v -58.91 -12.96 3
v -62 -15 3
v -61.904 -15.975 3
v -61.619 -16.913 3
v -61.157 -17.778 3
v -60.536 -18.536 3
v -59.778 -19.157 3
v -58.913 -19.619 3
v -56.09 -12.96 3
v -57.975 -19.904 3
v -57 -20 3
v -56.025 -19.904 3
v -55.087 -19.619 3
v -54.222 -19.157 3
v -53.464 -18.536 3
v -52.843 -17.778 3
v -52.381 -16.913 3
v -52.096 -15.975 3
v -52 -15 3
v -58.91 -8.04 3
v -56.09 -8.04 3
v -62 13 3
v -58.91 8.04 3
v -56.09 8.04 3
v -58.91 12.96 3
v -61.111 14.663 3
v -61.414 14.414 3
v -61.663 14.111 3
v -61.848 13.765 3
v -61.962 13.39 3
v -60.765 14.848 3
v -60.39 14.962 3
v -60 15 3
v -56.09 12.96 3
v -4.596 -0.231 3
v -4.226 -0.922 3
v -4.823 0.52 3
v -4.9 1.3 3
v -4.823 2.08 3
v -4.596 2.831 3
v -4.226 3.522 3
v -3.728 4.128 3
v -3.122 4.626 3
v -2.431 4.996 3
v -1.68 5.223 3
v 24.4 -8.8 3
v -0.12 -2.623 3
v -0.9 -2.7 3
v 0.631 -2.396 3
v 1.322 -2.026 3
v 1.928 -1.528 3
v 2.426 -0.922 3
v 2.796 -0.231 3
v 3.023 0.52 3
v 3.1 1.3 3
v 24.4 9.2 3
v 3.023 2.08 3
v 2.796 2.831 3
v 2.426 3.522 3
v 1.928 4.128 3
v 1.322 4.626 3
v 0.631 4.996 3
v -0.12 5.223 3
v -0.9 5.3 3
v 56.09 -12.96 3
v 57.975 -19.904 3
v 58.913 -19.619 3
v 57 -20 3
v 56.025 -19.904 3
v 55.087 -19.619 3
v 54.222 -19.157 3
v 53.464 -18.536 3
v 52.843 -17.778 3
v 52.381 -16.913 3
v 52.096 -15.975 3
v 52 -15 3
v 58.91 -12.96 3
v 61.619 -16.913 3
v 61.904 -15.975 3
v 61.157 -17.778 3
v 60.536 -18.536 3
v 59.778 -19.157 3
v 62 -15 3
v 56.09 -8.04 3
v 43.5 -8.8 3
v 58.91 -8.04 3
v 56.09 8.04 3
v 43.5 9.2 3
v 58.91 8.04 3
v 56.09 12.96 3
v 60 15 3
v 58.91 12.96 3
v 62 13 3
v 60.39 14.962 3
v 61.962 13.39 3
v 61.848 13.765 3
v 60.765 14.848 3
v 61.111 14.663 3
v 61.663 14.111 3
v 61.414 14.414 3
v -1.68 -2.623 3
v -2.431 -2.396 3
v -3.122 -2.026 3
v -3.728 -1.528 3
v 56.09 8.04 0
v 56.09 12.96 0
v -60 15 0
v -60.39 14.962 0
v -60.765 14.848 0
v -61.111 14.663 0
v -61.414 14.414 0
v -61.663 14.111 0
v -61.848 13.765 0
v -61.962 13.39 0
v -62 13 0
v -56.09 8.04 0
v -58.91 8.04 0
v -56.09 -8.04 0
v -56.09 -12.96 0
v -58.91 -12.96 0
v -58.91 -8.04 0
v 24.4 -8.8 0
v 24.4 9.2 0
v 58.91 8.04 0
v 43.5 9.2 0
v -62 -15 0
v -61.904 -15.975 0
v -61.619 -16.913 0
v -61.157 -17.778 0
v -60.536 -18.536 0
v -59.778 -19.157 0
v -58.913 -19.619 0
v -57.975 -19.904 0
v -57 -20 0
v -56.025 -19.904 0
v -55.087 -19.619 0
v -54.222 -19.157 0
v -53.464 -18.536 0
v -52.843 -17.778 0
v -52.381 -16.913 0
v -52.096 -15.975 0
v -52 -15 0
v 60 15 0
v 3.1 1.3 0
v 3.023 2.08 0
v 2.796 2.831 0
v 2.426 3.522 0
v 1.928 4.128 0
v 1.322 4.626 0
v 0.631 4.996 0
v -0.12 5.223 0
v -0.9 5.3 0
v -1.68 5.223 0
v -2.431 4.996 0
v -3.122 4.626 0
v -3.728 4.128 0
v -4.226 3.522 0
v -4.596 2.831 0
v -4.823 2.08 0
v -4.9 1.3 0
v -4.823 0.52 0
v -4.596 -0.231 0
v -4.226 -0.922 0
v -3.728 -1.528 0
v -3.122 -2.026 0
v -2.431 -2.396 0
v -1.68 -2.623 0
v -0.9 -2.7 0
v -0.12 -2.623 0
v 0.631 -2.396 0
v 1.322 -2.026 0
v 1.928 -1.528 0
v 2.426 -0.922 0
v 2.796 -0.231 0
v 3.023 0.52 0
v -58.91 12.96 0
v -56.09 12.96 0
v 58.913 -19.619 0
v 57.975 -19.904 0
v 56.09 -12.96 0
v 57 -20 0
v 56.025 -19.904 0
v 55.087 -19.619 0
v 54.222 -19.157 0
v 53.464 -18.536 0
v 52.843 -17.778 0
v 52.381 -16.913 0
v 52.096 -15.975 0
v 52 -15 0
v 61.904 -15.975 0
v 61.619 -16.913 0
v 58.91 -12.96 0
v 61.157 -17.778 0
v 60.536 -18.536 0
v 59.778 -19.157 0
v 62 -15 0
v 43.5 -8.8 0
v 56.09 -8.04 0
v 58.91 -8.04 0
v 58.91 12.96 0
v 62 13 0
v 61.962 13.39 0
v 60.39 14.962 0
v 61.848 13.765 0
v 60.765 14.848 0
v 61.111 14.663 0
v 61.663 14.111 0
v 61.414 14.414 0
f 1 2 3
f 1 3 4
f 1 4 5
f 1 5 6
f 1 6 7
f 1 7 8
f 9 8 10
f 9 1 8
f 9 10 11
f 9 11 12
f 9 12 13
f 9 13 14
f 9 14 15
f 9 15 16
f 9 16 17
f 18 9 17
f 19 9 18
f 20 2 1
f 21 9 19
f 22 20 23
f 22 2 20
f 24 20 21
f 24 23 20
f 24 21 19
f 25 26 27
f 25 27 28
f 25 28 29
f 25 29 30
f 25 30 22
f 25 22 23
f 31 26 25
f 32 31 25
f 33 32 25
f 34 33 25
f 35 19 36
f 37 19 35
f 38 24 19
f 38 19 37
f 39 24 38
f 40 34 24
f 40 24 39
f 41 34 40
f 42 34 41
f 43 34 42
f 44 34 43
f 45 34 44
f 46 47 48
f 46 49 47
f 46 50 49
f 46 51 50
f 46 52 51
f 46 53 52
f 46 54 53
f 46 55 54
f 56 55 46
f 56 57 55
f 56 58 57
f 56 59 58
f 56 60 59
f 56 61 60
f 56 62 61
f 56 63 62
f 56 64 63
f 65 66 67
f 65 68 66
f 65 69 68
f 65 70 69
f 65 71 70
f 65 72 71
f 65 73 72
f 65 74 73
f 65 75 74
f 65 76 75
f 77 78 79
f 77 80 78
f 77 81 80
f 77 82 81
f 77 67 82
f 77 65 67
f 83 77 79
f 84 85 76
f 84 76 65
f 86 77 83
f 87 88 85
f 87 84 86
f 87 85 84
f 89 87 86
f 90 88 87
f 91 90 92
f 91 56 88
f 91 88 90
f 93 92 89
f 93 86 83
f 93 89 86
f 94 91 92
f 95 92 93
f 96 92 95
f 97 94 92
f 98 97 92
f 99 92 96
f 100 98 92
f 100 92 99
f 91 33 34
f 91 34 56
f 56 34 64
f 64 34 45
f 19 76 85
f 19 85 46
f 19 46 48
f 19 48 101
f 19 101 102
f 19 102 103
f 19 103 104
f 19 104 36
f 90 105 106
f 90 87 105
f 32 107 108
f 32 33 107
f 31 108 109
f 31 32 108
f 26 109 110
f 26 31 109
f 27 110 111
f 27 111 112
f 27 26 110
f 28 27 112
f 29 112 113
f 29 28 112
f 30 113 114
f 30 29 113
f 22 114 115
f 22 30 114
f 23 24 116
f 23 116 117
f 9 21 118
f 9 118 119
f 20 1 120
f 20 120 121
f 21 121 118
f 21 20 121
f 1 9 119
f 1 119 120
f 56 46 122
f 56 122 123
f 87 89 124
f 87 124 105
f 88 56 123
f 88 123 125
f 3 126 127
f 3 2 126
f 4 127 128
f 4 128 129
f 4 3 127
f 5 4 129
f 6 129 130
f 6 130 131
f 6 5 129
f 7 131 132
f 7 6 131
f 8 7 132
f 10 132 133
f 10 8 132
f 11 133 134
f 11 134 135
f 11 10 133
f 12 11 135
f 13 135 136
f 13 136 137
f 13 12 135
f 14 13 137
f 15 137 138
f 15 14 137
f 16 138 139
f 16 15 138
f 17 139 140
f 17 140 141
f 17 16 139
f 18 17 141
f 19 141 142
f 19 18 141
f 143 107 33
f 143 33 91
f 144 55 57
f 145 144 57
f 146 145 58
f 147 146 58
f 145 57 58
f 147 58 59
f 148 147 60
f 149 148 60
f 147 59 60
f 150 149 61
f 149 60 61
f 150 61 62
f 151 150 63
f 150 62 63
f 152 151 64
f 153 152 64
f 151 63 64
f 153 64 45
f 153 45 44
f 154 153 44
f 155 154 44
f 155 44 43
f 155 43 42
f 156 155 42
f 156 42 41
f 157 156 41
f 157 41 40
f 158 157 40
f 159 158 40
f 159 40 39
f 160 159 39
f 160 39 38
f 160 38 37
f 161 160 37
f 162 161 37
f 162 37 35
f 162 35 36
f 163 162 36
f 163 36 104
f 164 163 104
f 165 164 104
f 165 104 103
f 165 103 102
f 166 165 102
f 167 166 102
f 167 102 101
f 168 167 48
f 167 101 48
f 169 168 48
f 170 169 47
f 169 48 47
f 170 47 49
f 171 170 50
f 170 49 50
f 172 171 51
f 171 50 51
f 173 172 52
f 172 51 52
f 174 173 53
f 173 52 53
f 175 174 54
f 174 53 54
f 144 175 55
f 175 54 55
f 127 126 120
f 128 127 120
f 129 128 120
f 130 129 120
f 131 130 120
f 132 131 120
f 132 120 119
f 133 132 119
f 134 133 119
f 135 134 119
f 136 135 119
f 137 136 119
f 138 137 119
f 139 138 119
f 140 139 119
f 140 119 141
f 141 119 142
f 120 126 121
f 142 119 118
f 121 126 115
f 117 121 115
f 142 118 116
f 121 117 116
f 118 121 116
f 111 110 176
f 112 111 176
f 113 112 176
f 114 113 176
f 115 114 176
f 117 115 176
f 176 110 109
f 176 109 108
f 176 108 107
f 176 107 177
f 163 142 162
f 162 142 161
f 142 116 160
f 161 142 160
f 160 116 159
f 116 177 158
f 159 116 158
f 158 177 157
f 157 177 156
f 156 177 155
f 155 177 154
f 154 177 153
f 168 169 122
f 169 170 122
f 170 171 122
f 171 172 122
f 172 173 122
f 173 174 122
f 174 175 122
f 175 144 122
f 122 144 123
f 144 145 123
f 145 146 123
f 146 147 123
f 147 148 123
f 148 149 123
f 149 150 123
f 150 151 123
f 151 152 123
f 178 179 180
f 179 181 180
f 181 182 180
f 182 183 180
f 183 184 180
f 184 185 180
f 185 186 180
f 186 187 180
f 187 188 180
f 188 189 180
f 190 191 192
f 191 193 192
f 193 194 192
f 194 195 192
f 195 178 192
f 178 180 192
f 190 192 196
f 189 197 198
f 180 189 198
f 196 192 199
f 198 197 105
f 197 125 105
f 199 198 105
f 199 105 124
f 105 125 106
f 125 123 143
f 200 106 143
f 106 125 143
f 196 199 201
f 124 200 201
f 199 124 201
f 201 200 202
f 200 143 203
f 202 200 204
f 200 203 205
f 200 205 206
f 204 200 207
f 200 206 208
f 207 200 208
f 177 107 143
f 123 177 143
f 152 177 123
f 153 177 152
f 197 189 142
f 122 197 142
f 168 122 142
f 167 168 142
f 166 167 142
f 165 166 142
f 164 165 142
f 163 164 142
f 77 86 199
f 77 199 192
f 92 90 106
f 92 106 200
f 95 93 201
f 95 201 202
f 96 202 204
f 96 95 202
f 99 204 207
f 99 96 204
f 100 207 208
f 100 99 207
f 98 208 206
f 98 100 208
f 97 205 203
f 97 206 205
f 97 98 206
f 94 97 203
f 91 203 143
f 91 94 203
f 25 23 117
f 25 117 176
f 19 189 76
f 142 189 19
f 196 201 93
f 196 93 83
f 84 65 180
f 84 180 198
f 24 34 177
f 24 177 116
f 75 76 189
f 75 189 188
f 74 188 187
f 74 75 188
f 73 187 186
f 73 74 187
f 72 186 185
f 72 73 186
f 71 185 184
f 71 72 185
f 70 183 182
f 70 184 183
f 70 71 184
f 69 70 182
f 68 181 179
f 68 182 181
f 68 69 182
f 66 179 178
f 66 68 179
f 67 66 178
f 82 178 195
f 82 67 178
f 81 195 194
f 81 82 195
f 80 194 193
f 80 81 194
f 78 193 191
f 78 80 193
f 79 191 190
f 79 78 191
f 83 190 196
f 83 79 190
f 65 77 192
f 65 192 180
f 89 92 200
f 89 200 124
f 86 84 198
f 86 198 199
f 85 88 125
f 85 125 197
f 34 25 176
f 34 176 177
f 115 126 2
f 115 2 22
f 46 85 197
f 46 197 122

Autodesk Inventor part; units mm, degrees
ref_plane "YZ Plane" through (0, 0, 0) normal (1, 0, 0) x (0, 1, 0)
ref_plane "XZ Plane" through (0, 0, 0) normal (0, 1, 0) x (-1, 0, 0)
ref_plane "XY Plane" through (0, 0, 0) normal (0, 0, 1) x (1, 0, 0)
sketch "Sketch1" plane through (0, 0, 0) normal (0, 0, 1) x (1, 0, 0)
  line L0 (-62, 15) -> (62, 15)
  line L1 (62, 15) -> (62, -15)
  line L2 (62, -15) -> (-62, -15)
  line L3 (-62, -15) -> (-62, 15)
  line L4 (-62, 15) -> (62, -15) construction
  line L5 (62, 15) -> (-62, -15) construction
  point P0 (0, 0)
  dimension "d0" = 124
  dimension "d1" = 30
extrude "Extrusion1" add sketch "Sketch1" along normal blind 3
sketch "Sketch3" plane through (0, 0, 3) normal (0, 0, 1) x (1, 0, 0)
  line L0 (62, 15) -> (-62, 15) projected
  line L1 (-62, -15) -> (62, -15) projected
  arc A0 (-62, -15) -> (-52, -15) centre (-57, -15) ccw
  line L2 (-62, -15) -> (-52, -15)
  point P0 (0, 0)
extrude "Extrusion3" add sketch "Sketch3" against normal blind 3
mirror "Mirror2" about plane through (0, 0, 0) normal (1, 0, 0) of "Extrusion3"
fillet "Fillet1" radius 2 1 edges at (-62, 15, 1.5)
fillet "Fillet2" radius 2 1 edges at (62, 15, 1.5)
sketch "Sketch5" plane through (0, 0, 3) normal (0, 0, 1) x (1, 0, 0)
  line L0 (-58.91, 12.96) -> (-56.09, 12.96)
  line L1 (-56.09, 12.96) -> (-56.09, 8.04)
  line L2 (-56.09, 8.04) -> (-58.91, 8.04)
  line L3 (-58.91, 8.04) -> (-58.91, 12.96)
  line L4 (-58.91, 12.96) -> (-56.09, 8.04) construction
  line L5 (-56.09, 12.96) -> (-58.91, 8.04) construction
  line L6 (60, 15) -> (-60, 15) projected
  line L7 (-58.91, -8.04) -> (-56.09, -8.04)
  line L8 (-56.09, -8.04) -> (-56.09, -12.96)
  line L9 (-56.09, -12.96) -> (-58.91, -12.96)
  line L10 (-58.91, -12.96) -> (-58.91, -8.04)
  line L11 (-58.91, -8.04) -> (-56.09, -12.96) construction
  line L12 (-56.09, -8.04) -> (-58.91, -12.96) construction
  line L13 (-52, -15) -> (52, -15) projected
  point P0 (0, 0)
  point P1 (-57.5, 10.5)
  point P2 (-57.5, -10.5)
  point P3 (-57.5, -10.5)
  point P4 (-57.5, 10.5)
  dimension "d31" = 2.82
  dimension "d32" = 4.92
  dimension "d33" = 57.5
  dimension "d34" = 4.5
  dimension "d35" = 4.5
extrude "Extrusion5" cut sketch "Sketch5" against normal through all
mirror "Mirror3" about plane through (0, 0, 0) normal (1, 0, 0) of "Extrusion5"
sketch "Sketch4" plane through (0, 0, 3) normal (0, 0, 1) x (1, 0, 0)
  line L0 (24.4, 9.2) -> (43.5, 9.2)
  line L1 (43.5, 9.2) -> (43.5, -8.8)
  line L2 (43.5, -8.8) -> (24.4, -8.8)
  line L3 (24.4, -8.8) -> (24.4, 9.2)
  circle A0 centre (-0.9, 1.3) radius 4
  line L4 (62, -15) -> (62, 13) projected
  line L5 (-52, -15) -> (52, -15) projected
  line L6 (48.8866, -5.2) -> (-45.0961, -5.2) construction
  line L7 (-51.0965, -10) -> (52, -10) construction
  line L8 (58.91, -12.96) -> (56.09, -12.96) projected
  line L9 (56.09, -12.96) -> (56.09, -8.04) projected
  line L10 (56.09, -8.04) -> (58.91, -8.04) projected
  line L11 (58.91, -8.04) -> (58.91, -12.96) projected
  line L12 (56.09, -8.04) -> (58.91, -12.96) construction
  line L13 (56.09, -12.96) -> (58.91, -8.04) construction
  line L14 (60, 15) -> (-60, 15) projected
  point P0 (0, 0)
  point P1 (57.5, -10.5)
  dimension "d19" = 18
  dimension "d20" = 19.1
  dimension "d24" = 8
  dimension "d28" = 3.6
  dimension "d29" = 5
  dimension "d30" = 4.8
  dimension "d39" = 58.4
  dimension "d41" = 13.7
  dimension "d42" = 18.5
extrude "Extrusion4" cut sketch "Sketch4" against normal through all contours L0 L1 L2 L3 | A0
equation "\"d35\" = d34"
equation "\"kerf\" = 0.13"
properties part number "FrontPanel" material "Acrylic, Clear"
